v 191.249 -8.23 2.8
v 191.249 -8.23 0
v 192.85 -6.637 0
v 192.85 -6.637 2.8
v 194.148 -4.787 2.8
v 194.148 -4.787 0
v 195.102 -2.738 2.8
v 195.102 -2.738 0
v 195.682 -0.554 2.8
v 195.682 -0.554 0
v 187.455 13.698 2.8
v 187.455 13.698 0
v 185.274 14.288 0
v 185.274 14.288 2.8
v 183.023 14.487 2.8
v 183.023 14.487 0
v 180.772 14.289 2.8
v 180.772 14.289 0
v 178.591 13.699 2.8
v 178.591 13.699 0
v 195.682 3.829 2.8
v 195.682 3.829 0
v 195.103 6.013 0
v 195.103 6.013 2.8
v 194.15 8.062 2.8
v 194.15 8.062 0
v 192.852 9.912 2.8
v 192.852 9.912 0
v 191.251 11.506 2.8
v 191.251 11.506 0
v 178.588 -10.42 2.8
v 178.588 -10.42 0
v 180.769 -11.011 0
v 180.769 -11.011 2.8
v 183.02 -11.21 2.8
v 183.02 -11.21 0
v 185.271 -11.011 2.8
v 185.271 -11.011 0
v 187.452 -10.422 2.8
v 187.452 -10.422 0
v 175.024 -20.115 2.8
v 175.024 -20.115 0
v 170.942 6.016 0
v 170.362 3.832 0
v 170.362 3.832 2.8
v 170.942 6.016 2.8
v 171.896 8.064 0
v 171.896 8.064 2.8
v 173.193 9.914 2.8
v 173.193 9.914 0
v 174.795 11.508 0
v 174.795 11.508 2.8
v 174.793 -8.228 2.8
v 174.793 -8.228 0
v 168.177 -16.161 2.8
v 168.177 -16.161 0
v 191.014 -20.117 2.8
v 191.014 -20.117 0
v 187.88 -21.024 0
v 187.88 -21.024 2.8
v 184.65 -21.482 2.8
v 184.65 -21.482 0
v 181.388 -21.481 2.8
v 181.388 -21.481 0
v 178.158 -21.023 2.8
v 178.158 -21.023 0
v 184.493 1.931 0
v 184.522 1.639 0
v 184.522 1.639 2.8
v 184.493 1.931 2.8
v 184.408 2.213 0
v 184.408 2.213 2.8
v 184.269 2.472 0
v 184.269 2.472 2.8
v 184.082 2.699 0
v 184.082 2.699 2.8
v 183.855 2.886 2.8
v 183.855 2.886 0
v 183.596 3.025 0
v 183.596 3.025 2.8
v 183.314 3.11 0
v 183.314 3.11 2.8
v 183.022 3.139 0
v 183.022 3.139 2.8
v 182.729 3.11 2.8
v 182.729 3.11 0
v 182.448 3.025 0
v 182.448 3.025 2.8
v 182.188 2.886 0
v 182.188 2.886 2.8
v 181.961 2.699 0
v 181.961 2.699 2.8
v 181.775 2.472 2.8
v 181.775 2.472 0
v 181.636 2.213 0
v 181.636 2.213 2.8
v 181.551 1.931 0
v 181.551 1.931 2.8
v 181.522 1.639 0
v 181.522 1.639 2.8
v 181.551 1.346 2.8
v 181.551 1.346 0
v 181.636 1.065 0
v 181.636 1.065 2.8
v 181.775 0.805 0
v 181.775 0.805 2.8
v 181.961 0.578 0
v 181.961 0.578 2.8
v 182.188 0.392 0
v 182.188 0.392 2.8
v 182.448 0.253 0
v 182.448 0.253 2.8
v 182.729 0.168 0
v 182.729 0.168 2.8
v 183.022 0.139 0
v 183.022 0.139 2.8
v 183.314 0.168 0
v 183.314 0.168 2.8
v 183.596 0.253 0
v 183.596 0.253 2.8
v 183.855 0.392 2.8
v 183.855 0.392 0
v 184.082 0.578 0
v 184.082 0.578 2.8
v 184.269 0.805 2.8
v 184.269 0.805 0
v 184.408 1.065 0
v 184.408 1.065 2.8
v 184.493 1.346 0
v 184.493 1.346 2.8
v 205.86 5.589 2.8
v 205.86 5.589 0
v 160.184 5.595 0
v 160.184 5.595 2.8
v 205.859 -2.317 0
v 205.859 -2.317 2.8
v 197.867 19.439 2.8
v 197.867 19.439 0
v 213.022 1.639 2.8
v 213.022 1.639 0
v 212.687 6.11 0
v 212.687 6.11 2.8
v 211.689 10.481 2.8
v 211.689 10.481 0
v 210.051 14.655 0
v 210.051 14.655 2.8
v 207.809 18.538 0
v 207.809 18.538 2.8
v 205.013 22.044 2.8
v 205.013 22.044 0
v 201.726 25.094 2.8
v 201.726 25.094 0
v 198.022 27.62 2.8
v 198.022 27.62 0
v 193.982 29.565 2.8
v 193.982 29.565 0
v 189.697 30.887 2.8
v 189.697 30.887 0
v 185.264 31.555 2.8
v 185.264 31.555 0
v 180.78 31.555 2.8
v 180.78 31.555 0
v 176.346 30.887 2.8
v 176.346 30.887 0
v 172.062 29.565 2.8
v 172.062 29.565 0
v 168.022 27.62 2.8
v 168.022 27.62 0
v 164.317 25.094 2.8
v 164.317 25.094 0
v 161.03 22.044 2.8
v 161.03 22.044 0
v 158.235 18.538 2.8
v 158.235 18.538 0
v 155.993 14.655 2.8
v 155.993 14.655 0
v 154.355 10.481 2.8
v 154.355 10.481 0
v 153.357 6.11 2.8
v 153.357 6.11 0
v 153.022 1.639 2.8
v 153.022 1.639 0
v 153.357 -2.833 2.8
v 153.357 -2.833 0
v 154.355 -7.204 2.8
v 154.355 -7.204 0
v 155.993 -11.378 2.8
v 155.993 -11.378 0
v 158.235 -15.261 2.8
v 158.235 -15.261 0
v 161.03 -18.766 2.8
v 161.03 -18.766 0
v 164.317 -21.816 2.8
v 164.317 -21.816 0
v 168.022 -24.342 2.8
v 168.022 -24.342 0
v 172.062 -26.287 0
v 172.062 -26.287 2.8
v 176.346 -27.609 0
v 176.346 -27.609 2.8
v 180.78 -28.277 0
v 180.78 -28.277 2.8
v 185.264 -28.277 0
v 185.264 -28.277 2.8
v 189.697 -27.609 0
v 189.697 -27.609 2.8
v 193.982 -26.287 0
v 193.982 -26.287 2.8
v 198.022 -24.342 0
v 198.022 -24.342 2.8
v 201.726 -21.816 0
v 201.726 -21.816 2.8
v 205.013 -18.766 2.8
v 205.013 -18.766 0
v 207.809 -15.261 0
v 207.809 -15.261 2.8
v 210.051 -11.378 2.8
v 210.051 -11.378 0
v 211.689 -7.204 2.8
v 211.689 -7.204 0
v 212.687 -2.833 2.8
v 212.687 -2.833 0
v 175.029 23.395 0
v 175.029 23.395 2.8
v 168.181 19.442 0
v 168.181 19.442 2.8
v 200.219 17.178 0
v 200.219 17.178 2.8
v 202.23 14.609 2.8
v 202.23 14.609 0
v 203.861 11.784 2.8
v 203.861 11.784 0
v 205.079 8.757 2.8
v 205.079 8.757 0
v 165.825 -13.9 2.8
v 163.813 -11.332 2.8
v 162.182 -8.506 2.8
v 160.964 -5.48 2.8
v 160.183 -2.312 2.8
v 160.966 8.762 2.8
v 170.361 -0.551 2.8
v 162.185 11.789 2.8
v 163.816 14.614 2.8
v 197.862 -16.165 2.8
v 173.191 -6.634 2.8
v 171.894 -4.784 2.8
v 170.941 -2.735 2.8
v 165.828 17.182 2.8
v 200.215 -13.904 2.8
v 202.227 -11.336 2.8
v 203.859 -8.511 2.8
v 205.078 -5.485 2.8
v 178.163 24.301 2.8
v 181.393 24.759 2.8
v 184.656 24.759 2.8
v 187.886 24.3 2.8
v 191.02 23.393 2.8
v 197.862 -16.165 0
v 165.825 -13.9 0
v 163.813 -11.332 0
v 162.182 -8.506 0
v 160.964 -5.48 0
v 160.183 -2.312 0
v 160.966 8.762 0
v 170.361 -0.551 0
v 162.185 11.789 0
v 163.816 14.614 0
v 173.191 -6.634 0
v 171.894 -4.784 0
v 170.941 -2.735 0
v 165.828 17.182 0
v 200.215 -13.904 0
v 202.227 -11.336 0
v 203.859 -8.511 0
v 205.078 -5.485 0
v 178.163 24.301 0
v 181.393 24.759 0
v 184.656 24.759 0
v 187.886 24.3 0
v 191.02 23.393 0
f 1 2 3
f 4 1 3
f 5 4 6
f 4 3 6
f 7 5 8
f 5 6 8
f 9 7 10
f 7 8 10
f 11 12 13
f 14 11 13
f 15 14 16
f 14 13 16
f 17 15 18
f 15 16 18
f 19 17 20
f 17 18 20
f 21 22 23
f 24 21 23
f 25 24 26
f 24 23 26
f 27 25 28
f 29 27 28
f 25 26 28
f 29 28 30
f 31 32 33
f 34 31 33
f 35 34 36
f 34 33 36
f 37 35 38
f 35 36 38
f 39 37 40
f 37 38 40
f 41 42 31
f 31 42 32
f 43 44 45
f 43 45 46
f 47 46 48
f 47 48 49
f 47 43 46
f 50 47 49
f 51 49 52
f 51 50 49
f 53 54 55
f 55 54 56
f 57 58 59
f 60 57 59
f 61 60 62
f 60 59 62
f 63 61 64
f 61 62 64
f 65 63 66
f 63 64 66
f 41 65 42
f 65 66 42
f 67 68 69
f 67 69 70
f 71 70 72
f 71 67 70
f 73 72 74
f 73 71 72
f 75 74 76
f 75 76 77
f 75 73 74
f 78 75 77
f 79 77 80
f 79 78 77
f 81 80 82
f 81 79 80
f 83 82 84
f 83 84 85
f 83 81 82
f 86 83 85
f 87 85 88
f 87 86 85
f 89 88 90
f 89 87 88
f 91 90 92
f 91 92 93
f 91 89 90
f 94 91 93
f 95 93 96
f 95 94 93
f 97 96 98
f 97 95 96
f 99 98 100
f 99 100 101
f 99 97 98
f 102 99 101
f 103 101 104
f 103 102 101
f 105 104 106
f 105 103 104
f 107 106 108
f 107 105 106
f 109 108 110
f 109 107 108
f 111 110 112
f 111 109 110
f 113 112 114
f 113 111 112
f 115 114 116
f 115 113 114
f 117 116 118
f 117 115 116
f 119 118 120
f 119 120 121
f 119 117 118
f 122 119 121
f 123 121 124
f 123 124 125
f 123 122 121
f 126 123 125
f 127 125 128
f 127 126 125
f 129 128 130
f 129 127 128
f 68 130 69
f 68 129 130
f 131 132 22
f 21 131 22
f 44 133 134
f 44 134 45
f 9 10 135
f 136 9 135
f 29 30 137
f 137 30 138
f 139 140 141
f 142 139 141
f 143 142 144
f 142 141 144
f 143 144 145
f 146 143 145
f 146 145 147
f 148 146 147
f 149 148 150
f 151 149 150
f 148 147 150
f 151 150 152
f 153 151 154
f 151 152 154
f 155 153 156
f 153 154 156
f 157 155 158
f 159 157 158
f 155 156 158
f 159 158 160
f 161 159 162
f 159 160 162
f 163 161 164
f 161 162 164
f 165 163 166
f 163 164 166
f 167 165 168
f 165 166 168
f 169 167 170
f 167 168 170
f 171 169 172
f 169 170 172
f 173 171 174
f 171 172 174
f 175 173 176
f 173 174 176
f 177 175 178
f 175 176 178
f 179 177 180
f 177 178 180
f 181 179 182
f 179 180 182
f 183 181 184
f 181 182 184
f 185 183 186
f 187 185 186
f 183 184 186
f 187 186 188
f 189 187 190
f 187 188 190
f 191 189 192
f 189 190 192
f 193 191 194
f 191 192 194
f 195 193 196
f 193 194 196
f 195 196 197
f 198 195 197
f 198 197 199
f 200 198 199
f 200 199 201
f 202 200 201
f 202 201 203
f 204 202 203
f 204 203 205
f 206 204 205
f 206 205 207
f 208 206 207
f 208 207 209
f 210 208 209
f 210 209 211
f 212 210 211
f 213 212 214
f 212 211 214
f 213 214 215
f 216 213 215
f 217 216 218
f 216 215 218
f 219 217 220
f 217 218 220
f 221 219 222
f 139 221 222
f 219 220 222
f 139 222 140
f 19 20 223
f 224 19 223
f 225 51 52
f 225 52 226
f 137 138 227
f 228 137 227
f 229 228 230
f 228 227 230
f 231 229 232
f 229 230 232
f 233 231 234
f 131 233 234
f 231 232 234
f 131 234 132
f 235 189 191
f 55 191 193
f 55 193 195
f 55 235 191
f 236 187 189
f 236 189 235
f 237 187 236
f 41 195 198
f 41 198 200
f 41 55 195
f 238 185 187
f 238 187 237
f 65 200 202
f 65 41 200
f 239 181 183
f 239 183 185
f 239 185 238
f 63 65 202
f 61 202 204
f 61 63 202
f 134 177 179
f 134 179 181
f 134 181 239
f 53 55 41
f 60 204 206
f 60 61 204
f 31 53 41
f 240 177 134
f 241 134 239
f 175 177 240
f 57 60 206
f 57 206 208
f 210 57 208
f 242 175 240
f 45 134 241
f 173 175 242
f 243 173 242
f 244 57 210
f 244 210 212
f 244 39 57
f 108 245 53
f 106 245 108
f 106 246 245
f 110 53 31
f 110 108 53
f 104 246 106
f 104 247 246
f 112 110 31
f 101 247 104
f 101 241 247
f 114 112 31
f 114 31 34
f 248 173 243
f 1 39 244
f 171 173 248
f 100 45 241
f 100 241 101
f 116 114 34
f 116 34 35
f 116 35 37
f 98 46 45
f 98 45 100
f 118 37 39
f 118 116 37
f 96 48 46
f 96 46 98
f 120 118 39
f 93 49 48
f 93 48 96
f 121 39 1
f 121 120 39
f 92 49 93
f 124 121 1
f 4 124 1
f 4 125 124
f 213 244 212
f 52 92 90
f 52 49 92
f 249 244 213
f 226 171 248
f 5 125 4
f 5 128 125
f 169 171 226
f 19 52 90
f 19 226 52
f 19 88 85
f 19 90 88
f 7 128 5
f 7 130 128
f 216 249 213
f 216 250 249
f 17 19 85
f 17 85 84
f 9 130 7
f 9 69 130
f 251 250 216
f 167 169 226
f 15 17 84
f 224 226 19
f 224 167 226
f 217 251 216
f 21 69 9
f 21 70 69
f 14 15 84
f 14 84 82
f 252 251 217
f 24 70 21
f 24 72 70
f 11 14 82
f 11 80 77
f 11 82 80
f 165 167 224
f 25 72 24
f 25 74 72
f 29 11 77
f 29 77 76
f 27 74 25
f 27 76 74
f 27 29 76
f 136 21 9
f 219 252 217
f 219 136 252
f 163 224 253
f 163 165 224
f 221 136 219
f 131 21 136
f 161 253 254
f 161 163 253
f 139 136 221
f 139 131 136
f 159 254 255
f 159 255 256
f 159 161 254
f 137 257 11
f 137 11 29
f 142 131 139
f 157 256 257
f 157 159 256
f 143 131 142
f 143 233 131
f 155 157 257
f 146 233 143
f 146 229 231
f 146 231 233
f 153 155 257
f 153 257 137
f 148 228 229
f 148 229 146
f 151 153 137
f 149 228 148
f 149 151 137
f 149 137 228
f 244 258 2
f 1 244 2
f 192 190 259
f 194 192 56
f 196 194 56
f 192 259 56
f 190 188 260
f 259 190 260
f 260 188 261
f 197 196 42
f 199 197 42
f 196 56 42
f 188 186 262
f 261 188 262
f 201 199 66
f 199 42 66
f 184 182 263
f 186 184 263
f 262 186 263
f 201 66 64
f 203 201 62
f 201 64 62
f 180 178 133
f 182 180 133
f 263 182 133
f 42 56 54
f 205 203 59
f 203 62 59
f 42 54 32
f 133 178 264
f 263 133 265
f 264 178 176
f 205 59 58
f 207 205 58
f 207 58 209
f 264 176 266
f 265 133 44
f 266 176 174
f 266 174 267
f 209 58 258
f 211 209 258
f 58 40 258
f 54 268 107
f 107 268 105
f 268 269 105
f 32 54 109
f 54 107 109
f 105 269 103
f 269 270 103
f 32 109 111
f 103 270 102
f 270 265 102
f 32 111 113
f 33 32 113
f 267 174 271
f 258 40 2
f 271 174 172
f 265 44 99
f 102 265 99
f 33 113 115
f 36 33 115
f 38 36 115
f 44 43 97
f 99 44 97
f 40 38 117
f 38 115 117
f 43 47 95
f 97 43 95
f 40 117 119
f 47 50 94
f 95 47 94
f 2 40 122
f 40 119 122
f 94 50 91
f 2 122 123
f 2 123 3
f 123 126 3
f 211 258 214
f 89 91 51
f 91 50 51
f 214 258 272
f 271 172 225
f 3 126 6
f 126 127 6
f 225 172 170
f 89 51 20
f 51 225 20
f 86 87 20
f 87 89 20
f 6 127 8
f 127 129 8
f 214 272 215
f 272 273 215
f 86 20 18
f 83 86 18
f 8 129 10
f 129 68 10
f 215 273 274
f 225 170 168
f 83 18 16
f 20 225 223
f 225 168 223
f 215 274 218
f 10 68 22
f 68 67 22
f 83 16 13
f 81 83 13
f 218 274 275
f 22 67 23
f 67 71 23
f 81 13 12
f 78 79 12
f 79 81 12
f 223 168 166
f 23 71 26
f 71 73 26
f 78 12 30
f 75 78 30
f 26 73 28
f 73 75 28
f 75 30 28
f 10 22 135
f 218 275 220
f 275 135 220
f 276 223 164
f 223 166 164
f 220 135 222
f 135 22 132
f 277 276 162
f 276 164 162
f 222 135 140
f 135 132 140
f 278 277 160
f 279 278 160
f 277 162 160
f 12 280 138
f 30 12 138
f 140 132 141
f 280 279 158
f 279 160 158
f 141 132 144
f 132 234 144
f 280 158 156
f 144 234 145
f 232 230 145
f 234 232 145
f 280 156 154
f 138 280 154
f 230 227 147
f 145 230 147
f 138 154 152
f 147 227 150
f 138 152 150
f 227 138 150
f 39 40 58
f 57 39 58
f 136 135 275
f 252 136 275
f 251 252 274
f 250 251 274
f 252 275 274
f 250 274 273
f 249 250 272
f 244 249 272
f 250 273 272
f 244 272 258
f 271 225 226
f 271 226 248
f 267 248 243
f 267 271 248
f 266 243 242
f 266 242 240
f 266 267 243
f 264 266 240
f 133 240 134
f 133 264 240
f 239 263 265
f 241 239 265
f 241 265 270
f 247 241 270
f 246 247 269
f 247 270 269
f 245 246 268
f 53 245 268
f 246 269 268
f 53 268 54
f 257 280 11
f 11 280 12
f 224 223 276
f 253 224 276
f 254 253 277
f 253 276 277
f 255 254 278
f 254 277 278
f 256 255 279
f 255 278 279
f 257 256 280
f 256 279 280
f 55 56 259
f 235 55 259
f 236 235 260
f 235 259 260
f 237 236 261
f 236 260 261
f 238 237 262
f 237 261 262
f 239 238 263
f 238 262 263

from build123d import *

# Parameters (mm, degrees)
MODEL_R             = 30
MODEL_R_2           = 1.5
BOSS_EXTRUDE1_DEPTH = 2.8


with BuildPart() as part:
    # Model → Boss-Extrude1 (new body)
    with BuildSketch(Plane.XY):
        with Locations((183.021792723, 1.638749849)):
            Circle(MODEL_R)
        with Locations((183.021792723, 1.638749849)):
            Circle(MODEL_R_2, mode=Mode.SUBTRACT)
        with BuildLine():
            Line((160.184310638, 5.594924102), (170.361966665, 3.831832156))
            ThreePointArc((170.361966665, 3.831832156), (171.89553669, 8.064264032), (174.794965696, 11.507899908))
            Line((174.794965696, 11.507899908), (168.18114531, 19.442038508))
            ThreePointArc((168.18114531, 19.442038508), (162.950768709, 13.229948999), (160.184310638, 5.594924102))
        make_face(mode=Mode.SUBTRACT)
        with BuildLine():
            Line((160.183368767, -2.31198349), (170.361444544, -0.551316319))
            ThreePointArc((170.361444544, -0.551316319), (171.894006192, -4.784113433), (174.792614703, -8.228439971))
            Line((174.792614703, -8.228439971), (168.176904275, -16.161002669))
            ThreePointArc((168.176904275, -16.161002669), (162.948007791, -9.947667252), (160.183368767, -2.31198349))
        make_face(mode=Mode.SUBTRACT)
        with BuildLine():
            Line((175.02401618, -20.115272149), (178.588271571, -10.420466378))
            ThreePointArc((178.588271571, -10.420466378), (183.020262224, -11.209627616), (187.452440761, -10.421522278))
            Line((187.452440761, -10.421522278), (191.01438636, -20.117176922))
            ThreePointArc((191.01438636, -20.117176922), (183.019031805, -21.538866402), (175.02401618, -20.115272149))
        make_face(mode=Mode.SUBTRACT)
        with BuildLine():
            Line((197.862440136, -16.16453881), (191.248619749, -8.23040021))
            ThreePointArc((191.248619749, -8.23040021), (194.148048755, -4.786764334), (195.68161878, -0.554332458))
            Line((195.68161878, -0.554332458), (205.859274808, -2.317424405))
            ThreePointArc((205.859274808, -2.317424405), (203.092816736, -9.952449302), (197.862440136, -16.16453881))
        make_face(mode=Mode.SUBTRACT)
        with BuildLine():
            Line((205.860216679, 5.589483188), (195.682140901, 3.828816016))
            ThreePointArc((195.682140901, 3.828816016), (194.149579254, 8.06161313), (191.250970742, 11.505939668))
            Line((191.250970742, 11.505939668), (197.86668117, 19.438502366))
            ThreePointArc((197.86668117, 19.438502366), (203.095577654, 13.225166949), (205.860216679, 5.589483188))
        make_face(mode=Mode.SUBTRACT)
        with BuildLine():
            Line((191.019569265, 23.392771846), (187.455313874, 13.697966076))
            ThreePointArc((187.455313874, 13.697966076), (183.023323222, 14.487127313), (178.591144685, 13.699021976))
            Line((178.591144685, 13.699021976), (175.029199085, 23.39467662))
            ThreePointArc((175.029199085, 23.39467662), (183.024553641, 24.8163661), (191.019569265, 23.392771846))
        make_face(mode=Mode.SUBTRACT)
    extrude(amount=BOSS_EXTRUDE1_DEPTH)


solid = part.part
